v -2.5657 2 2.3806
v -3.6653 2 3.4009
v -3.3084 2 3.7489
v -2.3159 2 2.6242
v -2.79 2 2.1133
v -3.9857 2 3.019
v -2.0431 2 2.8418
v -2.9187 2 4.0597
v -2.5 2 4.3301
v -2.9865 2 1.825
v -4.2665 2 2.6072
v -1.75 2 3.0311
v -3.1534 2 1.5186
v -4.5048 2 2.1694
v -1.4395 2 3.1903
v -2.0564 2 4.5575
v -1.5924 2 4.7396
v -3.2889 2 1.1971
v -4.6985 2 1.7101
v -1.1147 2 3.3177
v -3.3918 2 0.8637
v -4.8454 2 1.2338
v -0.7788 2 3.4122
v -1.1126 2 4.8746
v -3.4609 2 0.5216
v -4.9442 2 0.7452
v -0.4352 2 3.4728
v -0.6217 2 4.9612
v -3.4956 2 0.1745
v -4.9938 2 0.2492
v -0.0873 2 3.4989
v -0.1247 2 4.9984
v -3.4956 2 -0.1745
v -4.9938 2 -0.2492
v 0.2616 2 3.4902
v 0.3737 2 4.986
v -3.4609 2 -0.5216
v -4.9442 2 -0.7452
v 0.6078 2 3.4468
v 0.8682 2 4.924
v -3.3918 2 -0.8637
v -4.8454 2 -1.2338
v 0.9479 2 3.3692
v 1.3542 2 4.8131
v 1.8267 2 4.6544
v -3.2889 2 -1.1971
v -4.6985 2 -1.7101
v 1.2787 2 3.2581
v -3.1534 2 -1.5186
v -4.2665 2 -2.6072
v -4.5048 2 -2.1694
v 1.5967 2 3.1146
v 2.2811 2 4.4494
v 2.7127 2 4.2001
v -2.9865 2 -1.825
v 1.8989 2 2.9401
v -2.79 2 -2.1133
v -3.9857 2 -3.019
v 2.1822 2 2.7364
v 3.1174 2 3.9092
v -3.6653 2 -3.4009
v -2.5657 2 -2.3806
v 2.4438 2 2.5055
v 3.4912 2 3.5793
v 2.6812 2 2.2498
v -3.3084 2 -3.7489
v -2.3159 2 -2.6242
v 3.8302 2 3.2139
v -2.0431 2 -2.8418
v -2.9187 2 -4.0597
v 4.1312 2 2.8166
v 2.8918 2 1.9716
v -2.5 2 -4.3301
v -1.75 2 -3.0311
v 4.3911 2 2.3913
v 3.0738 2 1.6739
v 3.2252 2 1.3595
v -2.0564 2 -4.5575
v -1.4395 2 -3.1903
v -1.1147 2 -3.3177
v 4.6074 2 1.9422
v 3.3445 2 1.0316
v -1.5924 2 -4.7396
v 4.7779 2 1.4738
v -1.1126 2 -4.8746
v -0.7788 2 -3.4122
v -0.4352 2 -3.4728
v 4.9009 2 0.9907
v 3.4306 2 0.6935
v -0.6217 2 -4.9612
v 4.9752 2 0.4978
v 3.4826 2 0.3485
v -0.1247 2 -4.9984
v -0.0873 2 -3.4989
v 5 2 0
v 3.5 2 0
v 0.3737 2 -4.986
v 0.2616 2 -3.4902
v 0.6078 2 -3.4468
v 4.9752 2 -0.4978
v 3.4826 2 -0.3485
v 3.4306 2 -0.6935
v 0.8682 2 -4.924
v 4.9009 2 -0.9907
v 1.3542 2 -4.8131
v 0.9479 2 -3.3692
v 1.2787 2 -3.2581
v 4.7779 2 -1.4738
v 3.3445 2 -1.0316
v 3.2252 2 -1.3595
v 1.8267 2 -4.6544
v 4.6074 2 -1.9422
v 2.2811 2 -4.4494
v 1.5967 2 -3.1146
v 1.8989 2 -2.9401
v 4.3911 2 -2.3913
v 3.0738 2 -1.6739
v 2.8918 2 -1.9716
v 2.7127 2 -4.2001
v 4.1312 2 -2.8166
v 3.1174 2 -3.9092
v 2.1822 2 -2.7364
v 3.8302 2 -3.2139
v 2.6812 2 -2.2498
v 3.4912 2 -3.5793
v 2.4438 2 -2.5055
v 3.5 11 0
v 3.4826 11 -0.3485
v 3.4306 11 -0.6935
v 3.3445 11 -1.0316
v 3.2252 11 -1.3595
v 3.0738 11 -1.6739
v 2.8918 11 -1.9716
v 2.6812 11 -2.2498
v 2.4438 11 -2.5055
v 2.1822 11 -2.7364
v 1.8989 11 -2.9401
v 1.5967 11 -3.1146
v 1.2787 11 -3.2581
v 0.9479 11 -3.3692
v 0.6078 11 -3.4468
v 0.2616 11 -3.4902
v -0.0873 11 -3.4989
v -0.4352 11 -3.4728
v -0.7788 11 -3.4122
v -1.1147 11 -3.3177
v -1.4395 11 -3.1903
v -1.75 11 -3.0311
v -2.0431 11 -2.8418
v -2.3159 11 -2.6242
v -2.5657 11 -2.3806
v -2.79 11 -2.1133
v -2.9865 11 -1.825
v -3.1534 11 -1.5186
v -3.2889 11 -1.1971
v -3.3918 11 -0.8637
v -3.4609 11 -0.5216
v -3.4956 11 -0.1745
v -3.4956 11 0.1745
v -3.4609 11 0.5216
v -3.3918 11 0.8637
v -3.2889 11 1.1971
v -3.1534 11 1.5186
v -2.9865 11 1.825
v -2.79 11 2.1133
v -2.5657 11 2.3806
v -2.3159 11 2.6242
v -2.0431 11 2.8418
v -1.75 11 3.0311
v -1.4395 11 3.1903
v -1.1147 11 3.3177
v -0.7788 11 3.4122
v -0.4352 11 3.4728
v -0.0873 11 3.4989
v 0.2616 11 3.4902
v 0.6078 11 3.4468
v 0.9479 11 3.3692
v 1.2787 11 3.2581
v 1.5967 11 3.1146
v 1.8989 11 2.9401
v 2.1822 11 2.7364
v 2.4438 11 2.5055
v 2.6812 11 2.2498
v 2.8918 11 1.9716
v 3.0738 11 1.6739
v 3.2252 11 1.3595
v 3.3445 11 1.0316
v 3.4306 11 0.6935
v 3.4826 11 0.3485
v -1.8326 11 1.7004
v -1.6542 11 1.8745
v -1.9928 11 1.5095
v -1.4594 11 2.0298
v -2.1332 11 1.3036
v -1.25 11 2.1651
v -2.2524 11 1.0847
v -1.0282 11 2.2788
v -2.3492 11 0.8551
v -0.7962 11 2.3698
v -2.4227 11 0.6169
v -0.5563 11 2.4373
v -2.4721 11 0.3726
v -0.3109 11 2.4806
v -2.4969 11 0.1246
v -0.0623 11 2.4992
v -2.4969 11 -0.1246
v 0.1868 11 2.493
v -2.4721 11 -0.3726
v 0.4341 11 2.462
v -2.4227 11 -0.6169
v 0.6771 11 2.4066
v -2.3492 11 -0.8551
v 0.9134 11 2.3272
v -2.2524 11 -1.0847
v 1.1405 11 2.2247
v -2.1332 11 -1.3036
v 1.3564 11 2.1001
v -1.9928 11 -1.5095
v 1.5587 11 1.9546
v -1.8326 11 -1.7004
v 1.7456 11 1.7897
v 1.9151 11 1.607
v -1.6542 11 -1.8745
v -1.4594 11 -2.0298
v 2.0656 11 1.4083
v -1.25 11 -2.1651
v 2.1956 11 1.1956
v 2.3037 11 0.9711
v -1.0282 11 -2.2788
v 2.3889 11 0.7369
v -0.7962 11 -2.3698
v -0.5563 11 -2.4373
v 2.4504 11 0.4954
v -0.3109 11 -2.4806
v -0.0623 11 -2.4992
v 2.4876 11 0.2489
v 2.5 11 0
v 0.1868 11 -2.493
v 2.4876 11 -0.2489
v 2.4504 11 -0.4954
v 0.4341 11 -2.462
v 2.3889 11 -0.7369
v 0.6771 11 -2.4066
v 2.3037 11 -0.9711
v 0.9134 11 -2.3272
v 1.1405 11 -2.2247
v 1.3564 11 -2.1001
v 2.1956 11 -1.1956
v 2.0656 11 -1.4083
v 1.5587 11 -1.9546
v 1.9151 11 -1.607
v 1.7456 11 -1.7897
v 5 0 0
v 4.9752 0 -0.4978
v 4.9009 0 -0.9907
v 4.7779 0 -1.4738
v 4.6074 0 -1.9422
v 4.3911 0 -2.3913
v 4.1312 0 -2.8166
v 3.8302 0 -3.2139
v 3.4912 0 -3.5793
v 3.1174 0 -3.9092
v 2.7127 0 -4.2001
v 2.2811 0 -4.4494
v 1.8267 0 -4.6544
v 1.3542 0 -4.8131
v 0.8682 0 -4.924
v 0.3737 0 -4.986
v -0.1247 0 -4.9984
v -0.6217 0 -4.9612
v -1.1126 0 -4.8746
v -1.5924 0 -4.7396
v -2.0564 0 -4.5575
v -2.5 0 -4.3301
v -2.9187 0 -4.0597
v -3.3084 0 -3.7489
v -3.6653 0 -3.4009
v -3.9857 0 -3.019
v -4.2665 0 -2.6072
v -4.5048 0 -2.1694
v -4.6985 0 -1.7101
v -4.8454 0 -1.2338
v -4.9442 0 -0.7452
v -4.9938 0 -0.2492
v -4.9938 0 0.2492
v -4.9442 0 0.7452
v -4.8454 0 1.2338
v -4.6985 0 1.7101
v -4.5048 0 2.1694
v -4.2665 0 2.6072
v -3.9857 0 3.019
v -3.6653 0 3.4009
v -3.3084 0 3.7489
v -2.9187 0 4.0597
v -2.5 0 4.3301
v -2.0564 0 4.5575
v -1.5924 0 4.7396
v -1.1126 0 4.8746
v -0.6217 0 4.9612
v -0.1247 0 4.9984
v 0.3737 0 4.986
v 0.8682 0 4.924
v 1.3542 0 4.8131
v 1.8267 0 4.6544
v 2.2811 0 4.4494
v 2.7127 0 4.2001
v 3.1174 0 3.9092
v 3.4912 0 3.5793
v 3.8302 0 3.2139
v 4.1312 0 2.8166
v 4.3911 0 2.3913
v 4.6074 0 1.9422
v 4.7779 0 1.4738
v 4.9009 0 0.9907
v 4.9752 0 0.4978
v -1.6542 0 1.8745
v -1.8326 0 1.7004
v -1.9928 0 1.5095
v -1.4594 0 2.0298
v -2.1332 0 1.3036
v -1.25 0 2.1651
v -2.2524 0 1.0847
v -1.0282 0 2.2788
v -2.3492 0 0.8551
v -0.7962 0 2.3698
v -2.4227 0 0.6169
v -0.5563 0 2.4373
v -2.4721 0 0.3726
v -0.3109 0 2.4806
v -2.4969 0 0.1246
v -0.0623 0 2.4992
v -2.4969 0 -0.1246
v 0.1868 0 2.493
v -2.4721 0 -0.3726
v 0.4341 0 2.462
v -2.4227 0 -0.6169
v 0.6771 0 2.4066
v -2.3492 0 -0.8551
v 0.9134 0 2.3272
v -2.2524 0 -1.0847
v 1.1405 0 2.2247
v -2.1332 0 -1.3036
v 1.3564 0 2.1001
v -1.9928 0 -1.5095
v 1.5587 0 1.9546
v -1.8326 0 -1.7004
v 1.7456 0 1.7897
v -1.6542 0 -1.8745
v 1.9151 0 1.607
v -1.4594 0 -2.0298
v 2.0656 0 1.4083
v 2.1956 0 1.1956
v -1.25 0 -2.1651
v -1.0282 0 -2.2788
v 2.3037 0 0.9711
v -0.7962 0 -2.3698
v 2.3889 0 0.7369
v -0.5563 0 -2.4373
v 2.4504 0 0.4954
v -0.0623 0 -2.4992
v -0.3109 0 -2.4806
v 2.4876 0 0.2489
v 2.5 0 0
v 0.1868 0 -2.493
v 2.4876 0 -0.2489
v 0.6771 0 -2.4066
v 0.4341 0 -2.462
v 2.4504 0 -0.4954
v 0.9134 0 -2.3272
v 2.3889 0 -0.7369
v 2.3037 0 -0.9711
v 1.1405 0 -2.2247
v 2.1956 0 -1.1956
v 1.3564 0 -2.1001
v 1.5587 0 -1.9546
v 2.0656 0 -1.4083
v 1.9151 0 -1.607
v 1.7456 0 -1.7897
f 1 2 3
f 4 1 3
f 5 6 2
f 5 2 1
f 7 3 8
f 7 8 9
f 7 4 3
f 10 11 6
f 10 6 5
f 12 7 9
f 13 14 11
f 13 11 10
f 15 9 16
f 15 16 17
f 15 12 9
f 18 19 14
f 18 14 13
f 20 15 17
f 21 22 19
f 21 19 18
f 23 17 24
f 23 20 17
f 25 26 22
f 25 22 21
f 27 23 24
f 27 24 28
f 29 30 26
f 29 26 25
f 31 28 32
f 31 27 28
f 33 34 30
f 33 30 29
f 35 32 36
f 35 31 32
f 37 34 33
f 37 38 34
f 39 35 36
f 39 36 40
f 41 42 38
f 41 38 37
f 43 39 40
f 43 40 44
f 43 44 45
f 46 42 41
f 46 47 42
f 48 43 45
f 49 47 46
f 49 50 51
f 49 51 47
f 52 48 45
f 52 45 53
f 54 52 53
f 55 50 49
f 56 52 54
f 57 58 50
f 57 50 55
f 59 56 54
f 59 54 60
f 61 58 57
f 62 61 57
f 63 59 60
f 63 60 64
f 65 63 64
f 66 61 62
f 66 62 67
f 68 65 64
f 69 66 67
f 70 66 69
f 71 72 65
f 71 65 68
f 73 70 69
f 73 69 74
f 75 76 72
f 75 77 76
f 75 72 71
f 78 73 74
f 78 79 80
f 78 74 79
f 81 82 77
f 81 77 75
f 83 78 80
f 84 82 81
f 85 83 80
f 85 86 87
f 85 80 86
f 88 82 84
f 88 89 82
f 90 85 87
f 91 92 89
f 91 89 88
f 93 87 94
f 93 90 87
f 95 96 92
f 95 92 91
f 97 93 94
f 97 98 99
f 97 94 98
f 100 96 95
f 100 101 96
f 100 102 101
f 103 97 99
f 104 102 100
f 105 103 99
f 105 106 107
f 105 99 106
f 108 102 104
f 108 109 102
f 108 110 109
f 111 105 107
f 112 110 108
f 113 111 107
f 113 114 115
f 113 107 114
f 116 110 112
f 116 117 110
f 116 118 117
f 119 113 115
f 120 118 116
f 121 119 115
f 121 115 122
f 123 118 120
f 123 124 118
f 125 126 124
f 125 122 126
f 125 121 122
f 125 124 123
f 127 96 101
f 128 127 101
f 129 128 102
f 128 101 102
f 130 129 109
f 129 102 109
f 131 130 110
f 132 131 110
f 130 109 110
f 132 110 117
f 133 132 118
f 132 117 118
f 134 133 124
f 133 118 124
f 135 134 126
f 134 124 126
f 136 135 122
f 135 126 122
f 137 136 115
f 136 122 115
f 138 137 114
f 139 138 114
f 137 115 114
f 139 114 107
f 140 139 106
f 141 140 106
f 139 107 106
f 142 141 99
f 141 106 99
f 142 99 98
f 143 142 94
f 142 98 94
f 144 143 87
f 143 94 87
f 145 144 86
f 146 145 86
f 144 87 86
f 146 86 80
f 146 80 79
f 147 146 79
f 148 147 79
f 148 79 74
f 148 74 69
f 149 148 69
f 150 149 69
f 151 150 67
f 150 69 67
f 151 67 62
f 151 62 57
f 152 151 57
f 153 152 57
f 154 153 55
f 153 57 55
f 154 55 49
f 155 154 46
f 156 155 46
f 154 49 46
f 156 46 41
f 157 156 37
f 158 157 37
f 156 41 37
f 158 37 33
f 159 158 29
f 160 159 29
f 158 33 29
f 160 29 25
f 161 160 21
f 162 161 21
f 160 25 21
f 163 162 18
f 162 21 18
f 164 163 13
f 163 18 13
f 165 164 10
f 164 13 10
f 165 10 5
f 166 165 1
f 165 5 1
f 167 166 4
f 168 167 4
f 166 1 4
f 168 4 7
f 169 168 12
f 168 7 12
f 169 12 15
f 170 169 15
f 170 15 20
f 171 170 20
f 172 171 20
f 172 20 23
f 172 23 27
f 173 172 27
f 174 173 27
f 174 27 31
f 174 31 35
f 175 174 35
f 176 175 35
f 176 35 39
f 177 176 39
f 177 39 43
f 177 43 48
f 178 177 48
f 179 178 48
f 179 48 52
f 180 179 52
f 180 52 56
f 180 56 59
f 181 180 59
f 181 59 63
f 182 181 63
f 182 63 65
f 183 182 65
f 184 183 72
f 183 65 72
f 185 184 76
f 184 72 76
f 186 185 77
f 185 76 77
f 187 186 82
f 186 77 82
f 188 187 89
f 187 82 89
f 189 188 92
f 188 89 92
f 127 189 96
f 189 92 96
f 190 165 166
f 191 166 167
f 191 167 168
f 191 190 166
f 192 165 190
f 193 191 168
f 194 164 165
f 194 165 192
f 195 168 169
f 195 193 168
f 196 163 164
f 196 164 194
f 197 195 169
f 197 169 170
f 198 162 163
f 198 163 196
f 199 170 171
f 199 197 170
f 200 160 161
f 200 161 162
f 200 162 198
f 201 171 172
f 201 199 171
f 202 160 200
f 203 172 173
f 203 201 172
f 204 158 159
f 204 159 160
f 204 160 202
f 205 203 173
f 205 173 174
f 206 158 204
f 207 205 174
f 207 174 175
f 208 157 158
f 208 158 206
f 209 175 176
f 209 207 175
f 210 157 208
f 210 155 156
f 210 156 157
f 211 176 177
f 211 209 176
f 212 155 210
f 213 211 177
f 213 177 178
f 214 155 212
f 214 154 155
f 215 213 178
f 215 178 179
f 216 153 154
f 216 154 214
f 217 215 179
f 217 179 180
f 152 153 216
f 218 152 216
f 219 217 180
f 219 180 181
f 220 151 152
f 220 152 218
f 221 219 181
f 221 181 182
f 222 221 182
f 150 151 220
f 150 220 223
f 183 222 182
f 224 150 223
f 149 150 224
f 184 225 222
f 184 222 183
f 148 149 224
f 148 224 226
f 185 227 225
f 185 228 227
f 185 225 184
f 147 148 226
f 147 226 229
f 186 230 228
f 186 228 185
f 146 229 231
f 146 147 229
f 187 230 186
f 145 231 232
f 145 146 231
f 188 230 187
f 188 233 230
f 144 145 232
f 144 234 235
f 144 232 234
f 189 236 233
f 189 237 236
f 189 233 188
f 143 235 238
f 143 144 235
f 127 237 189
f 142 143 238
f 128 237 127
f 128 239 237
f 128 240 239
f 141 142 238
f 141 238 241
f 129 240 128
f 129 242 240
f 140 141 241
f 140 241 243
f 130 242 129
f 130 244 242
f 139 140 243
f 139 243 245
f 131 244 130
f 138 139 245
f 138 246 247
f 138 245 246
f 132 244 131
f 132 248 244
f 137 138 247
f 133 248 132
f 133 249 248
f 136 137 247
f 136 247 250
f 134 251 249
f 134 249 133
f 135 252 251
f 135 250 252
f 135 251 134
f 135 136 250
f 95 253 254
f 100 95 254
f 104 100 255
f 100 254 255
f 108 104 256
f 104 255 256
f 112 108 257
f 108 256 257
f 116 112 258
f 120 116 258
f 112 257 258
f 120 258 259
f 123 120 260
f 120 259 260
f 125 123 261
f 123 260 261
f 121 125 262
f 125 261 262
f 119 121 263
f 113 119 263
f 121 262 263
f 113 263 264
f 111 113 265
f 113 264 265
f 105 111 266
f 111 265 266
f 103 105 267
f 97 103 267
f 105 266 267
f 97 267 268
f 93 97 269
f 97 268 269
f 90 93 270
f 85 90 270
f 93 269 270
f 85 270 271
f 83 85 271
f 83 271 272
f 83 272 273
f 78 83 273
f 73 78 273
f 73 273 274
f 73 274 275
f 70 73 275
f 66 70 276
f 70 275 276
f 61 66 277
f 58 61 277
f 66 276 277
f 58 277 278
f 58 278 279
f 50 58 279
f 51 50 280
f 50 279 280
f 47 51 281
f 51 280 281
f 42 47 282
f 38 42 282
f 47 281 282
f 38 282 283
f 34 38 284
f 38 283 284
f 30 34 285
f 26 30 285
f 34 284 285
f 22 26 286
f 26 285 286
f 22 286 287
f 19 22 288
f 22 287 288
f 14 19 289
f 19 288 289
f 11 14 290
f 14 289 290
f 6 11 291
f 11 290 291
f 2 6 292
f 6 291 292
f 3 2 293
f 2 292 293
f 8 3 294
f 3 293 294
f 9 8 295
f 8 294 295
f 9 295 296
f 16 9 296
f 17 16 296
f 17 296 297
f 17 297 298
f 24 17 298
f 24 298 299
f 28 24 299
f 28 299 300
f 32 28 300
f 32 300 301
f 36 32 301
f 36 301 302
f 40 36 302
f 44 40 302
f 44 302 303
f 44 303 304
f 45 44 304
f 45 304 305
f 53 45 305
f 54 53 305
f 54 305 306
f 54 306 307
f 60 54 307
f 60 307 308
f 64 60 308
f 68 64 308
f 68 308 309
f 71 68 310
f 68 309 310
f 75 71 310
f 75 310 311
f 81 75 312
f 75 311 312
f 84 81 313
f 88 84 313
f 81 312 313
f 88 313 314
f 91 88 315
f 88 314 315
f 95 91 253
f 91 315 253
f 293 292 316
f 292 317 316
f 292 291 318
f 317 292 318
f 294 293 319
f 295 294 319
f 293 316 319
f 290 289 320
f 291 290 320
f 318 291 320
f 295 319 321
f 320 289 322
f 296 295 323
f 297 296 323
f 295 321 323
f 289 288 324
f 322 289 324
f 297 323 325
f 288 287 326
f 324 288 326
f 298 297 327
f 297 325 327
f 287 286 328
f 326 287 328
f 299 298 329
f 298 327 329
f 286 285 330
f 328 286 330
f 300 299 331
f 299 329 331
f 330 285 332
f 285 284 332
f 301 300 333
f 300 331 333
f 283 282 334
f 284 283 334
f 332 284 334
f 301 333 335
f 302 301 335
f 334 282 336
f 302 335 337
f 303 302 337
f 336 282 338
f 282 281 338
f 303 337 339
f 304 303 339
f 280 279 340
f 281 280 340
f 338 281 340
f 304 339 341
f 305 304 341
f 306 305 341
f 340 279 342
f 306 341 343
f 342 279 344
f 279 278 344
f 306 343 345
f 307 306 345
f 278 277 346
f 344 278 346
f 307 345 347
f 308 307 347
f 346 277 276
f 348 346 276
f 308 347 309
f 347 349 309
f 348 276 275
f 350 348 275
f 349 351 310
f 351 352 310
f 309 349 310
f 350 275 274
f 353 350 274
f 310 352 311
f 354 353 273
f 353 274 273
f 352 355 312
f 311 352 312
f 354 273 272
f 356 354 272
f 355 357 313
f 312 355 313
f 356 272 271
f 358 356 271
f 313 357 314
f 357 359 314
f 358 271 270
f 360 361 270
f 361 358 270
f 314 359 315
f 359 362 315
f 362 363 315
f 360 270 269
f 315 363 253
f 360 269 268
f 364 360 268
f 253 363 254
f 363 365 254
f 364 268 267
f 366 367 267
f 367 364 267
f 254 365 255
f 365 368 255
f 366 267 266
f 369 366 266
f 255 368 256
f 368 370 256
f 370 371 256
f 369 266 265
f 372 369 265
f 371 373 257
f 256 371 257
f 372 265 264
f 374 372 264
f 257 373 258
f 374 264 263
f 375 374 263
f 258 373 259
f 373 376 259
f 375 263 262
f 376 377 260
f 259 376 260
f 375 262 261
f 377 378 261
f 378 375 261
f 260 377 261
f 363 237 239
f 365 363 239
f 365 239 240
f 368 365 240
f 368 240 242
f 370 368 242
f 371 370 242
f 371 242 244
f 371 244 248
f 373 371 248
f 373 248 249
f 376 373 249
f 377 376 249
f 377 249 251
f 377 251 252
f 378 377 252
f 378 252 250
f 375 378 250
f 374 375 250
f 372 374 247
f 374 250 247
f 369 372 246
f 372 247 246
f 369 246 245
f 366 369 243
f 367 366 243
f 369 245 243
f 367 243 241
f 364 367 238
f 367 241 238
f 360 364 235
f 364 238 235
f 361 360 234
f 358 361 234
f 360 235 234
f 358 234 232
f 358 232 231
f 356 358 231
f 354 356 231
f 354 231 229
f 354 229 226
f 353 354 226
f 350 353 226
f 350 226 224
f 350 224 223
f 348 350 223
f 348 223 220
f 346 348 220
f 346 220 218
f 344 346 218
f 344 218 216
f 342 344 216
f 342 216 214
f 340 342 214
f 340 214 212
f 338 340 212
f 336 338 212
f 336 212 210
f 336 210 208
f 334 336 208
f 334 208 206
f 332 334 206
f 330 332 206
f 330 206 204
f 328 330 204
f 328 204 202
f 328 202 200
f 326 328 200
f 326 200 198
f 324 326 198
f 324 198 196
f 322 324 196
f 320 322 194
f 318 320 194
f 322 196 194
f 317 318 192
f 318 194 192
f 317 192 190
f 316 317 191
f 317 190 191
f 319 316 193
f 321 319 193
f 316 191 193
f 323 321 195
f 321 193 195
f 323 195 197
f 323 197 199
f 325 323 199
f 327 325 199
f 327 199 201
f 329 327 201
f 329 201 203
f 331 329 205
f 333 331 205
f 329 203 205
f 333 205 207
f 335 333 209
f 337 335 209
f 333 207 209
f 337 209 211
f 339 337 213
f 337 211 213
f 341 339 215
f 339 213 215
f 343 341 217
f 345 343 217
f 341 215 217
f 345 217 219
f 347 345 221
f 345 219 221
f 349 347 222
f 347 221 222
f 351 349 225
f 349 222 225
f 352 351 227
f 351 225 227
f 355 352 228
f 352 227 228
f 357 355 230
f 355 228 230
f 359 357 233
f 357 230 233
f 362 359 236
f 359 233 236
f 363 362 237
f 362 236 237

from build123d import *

# Parameters (mm, degrees)
SKETCH_1_R          = 5
EXTRUDE_1_DEPTH     = 2
SKETCH_2_R          = 3.5
EXTRUDE_2_DEPTH     = 9
SKETCH_3_R          = 2.5
CUT_EXTRUDE_1_DEPTH = 12


with BuildPart() as part:
    # Эскиз1 → Бобышка-Вытянуть1 (new body)
    with BuildSketch(Plane(origin=(0, 0, 0), x_dir=(1, 0, 0), z_dir=(0, 1, 0))):
        Circle(SKETCH_1_R)
    extrude(amount=EXTRUDE_1_DEPTH)

    # Эскиз2 → Бобышка-Вытянуть2 (add)
    with BuildSketch(Plane(origin=(0, 2, 0), x_dir=(1, 0, 0), z_dir=(0, 1, 0))):
        Circle(SKETCH_2_R)
    extrude(amount=EXTRUDE_2_DEPTH)

    # Эскиз3 → Вырез-Вытянуть1 (cut, through all)
    with BuildSketch(Plane(origin=(0, 11, 0), x_dir=(1, 0, 0), z_dir=(0, 1, 0))):
        Circle(SKETCH_3_R)
    extrude(amount=-CUT_EXTRUDE_1_DEPTH, mode=Mode.SUBTRACT)


solid = part.part
